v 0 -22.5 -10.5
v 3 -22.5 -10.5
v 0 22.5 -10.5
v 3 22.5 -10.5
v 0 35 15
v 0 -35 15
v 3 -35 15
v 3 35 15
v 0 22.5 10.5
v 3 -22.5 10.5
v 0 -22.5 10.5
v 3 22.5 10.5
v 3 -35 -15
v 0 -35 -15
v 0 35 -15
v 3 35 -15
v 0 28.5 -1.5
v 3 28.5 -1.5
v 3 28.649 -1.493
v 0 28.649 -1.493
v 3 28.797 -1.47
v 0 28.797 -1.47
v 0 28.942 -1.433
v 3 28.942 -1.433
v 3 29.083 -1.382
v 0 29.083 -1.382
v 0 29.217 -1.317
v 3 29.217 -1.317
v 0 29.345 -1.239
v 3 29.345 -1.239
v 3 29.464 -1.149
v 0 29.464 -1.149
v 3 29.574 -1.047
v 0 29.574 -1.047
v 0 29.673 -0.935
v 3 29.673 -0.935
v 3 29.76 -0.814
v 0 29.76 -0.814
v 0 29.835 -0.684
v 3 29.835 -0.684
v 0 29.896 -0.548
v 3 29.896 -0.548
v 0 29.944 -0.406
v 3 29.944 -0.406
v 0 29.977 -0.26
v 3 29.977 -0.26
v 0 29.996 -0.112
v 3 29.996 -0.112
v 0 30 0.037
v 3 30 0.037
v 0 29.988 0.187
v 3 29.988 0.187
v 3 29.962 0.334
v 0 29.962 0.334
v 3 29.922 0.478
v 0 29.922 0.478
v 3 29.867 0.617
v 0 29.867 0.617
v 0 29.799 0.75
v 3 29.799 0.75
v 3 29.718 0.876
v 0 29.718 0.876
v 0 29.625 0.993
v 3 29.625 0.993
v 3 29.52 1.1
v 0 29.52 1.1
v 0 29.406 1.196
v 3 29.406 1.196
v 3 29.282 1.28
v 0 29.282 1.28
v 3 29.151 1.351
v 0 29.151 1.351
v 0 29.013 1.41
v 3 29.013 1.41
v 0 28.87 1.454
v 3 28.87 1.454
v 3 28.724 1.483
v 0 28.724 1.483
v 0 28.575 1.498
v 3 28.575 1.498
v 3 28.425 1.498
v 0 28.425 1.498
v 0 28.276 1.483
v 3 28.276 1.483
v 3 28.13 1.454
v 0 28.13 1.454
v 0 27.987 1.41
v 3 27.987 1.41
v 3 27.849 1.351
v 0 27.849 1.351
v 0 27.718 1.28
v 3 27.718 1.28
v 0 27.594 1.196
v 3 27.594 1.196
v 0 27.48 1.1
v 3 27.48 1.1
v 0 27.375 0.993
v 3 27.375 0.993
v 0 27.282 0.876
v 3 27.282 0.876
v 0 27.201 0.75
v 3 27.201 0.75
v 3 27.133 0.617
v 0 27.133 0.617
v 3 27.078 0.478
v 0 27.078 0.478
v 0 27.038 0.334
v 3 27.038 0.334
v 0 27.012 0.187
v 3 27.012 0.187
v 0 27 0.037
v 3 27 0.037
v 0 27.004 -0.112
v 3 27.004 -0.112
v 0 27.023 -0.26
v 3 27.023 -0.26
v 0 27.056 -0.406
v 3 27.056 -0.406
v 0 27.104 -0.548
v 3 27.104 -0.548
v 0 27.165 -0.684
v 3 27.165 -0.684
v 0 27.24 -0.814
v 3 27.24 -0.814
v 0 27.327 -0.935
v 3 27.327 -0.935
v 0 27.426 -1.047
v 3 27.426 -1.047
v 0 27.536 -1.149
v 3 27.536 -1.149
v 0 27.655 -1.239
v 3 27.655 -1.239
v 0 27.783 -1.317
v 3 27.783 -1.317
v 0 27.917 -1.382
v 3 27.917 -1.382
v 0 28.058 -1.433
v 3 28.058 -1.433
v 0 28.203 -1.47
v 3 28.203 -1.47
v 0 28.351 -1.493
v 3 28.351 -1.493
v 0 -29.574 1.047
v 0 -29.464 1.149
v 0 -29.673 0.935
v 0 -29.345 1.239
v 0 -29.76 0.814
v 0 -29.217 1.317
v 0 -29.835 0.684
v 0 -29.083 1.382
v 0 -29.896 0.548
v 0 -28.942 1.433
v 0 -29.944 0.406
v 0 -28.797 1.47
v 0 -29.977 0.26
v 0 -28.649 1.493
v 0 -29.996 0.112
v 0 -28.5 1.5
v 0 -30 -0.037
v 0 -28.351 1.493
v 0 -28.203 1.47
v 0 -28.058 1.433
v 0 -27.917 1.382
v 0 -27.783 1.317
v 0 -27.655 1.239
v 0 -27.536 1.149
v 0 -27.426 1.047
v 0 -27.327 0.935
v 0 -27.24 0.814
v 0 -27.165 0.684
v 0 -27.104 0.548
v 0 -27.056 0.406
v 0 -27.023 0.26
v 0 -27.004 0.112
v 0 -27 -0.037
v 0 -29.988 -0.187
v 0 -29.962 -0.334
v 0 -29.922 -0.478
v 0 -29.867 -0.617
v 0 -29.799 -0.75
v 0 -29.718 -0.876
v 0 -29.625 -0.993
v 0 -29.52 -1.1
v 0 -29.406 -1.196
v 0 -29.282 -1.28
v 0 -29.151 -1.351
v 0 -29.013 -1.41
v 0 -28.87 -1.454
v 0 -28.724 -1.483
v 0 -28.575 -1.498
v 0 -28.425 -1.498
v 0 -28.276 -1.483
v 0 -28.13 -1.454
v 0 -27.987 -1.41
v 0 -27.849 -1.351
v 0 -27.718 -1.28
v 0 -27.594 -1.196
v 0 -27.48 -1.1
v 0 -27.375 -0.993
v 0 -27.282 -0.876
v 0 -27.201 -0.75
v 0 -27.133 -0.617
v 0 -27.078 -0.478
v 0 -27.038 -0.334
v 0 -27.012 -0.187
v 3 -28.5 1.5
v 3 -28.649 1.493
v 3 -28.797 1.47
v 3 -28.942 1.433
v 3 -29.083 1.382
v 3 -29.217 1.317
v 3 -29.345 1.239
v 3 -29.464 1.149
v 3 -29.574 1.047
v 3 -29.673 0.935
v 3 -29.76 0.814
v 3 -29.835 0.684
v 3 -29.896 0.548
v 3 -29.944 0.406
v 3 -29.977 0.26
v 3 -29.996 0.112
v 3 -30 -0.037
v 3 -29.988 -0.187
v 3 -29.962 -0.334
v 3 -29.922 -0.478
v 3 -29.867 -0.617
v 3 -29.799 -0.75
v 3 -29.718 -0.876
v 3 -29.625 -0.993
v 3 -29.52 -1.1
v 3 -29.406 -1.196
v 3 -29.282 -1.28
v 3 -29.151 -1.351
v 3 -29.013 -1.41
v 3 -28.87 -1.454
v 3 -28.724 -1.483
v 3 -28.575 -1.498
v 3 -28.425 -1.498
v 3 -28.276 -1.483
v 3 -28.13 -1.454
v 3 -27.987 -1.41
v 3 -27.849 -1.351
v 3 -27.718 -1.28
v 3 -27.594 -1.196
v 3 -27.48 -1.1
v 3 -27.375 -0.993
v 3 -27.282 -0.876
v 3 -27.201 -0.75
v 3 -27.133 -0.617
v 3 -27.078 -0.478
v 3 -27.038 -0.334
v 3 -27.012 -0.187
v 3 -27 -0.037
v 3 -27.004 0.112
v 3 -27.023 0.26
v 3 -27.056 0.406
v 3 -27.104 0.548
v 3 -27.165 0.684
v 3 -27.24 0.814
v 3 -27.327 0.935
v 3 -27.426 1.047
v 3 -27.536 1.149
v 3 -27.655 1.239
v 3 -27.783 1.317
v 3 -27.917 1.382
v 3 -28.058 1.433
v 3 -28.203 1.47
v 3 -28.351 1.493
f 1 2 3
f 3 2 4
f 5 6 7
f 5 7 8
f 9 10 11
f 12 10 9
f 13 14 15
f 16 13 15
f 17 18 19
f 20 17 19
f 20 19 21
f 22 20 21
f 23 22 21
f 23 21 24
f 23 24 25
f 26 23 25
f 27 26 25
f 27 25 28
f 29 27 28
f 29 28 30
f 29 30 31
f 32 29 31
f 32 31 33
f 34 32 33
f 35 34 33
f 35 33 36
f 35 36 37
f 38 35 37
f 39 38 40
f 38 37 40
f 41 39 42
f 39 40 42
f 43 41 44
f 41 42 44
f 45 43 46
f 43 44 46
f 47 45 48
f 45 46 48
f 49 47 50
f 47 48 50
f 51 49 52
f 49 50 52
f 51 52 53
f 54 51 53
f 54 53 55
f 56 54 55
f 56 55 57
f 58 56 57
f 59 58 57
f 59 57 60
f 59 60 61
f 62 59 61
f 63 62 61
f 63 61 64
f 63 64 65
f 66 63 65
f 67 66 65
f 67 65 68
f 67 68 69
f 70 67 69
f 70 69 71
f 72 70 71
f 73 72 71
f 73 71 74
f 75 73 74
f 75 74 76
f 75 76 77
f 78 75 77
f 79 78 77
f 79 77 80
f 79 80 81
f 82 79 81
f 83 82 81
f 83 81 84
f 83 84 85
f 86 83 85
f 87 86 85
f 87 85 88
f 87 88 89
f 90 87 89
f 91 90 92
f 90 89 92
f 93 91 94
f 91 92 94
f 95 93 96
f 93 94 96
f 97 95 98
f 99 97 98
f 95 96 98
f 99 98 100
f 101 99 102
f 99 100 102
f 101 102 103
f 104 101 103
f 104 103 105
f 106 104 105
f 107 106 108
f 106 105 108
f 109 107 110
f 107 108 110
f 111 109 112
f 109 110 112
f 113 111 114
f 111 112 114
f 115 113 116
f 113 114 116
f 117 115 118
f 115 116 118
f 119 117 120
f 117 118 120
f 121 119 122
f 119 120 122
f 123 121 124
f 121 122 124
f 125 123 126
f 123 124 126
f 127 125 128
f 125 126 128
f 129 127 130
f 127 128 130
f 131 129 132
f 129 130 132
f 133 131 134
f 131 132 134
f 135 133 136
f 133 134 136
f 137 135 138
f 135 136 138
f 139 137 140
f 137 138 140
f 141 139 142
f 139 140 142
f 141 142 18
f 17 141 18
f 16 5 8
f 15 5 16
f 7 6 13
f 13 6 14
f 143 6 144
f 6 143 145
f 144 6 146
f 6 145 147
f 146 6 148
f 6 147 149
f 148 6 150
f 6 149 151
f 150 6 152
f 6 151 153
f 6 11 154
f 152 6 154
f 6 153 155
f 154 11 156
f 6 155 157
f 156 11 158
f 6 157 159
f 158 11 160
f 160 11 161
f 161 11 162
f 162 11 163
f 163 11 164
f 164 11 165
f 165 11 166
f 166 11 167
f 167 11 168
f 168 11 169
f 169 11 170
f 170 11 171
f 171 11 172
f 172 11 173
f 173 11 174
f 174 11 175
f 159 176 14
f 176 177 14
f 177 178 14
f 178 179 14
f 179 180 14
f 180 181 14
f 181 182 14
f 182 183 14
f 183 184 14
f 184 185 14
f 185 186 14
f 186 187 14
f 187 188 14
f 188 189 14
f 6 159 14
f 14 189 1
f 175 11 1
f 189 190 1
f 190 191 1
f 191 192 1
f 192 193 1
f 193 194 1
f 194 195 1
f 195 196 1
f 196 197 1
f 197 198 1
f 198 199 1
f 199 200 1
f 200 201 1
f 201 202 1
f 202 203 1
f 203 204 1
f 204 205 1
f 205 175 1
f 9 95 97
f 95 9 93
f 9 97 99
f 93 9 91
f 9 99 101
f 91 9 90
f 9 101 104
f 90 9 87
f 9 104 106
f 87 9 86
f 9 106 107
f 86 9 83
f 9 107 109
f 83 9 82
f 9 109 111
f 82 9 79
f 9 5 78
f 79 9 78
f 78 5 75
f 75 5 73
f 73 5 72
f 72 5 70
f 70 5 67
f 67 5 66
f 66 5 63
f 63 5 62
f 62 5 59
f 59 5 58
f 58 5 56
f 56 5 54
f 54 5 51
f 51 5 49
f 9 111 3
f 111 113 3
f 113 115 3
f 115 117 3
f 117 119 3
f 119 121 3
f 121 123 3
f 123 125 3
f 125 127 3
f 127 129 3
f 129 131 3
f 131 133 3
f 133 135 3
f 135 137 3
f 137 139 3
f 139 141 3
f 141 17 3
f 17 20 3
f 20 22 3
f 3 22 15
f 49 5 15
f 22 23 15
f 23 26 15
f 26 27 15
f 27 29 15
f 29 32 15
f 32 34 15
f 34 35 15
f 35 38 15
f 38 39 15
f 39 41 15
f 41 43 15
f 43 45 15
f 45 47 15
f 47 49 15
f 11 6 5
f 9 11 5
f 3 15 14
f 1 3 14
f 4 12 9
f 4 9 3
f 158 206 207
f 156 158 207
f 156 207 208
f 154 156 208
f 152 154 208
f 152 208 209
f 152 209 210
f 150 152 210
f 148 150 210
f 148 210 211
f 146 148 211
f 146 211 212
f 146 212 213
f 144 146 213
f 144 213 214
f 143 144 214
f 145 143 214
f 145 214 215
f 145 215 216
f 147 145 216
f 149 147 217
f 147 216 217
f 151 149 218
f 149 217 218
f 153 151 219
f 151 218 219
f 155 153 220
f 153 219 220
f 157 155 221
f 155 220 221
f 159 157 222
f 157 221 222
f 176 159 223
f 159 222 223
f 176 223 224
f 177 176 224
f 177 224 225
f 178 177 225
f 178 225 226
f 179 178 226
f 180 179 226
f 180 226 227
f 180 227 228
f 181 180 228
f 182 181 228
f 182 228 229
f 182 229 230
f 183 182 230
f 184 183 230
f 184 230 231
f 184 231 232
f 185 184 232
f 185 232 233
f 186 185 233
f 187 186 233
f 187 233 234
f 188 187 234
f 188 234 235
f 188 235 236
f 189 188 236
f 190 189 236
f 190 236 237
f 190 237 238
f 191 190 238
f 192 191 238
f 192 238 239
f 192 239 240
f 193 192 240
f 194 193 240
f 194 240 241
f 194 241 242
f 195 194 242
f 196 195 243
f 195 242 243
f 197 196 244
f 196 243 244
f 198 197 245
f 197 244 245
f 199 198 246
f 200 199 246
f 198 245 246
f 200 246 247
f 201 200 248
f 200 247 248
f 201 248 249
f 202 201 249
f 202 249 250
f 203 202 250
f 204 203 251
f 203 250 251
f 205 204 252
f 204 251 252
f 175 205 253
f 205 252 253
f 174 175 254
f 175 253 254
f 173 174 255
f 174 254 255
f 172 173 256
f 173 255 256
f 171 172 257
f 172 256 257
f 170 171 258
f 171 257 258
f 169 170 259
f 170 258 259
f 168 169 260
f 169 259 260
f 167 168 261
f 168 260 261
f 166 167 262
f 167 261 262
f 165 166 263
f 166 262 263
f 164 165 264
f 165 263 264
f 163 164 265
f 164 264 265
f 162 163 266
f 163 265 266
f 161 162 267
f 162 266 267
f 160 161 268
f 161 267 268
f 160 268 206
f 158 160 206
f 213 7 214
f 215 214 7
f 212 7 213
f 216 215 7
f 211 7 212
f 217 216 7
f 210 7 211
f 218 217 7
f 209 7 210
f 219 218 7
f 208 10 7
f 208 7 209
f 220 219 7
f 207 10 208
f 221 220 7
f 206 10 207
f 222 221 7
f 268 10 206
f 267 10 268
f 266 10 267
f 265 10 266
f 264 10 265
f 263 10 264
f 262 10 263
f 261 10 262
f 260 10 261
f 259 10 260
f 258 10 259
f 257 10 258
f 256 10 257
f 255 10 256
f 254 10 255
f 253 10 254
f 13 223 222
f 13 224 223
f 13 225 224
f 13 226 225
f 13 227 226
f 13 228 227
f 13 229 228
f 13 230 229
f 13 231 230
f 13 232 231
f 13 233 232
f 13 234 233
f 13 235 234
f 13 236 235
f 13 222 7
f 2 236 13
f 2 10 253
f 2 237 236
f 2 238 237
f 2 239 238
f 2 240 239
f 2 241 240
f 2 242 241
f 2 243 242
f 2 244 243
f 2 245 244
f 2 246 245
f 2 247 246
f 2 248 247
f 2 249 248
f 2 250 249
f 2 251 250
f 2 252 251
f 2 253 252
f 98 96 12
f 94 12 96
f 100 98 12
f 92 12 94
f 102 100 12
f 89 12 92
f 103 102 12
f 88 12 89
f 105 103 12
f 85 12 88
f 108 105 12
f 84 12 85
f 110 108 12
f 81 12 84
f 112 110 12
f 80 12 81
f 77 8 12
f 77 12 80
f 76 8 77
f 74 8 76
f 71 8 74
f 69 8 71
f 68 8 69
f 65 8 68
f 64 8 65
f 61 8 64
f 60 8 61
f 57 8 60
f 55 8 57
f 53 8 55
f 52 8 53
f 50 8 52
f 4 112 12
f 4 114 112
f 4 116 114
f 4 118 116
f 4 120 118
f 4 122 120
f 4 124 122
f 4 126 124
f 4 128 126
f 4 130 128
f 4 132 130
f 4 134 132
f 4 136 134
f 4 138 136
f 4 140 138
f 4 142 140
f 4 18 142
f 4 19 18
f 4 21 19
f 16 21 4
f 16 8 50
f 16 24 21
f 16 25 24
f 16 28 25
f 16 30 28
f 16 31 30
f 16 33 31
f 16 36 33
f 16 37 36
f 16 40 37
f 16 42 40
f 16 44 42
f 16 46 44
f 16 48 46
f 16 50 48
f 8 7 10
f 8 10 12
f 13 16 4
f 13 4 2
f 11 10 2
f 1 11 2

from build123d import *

# Parameters (mm, degrees)
SKETCH1_W           = 30
SKETCH1_H           = 70
BOSS_EXTRUDE1_DEPTH = 3
SKETCH2_R           = 1.5
SKETCH2_W           = 21
SKETCH2_H           = 45
CUT_EXTRUDE1_DEPTH  = 39.19685851


with BuildPart() as part:
    # Sketch1 → Boss-Extrude1 (new body)
    with BuildSketch(Plane(origin=(0, 0, 0), x_dir=(0, 0, -1), z_dir=(1, 0, 0))):
        Rectangle(SKETCH1_W, SKETCH1_H)
    extrude(amount=BOSS_EXTRUDE1_DEPTH)

    # Sketch2 → Cut-Extrude1 (cut, through all)
    with BuildSketch(Plane(origin=(3, 0, 0), x_dir=(0, 0, -1), z_dir=(1, 0, 0))):
        with Locations((0, 28.5)):
            Circle(SKETCH2_R)
        with Locations(Location((0, -28.5, 0), (0, 0, 180))):
            Circle(SKETCH2_R)
        Rectangle(SKETCH2_W, SKETCH2_H)
    extrude(amount=-CUT_EXTRUDE1_DEPTH, mode=Mode.SUBTRACT)


solid = part.part
